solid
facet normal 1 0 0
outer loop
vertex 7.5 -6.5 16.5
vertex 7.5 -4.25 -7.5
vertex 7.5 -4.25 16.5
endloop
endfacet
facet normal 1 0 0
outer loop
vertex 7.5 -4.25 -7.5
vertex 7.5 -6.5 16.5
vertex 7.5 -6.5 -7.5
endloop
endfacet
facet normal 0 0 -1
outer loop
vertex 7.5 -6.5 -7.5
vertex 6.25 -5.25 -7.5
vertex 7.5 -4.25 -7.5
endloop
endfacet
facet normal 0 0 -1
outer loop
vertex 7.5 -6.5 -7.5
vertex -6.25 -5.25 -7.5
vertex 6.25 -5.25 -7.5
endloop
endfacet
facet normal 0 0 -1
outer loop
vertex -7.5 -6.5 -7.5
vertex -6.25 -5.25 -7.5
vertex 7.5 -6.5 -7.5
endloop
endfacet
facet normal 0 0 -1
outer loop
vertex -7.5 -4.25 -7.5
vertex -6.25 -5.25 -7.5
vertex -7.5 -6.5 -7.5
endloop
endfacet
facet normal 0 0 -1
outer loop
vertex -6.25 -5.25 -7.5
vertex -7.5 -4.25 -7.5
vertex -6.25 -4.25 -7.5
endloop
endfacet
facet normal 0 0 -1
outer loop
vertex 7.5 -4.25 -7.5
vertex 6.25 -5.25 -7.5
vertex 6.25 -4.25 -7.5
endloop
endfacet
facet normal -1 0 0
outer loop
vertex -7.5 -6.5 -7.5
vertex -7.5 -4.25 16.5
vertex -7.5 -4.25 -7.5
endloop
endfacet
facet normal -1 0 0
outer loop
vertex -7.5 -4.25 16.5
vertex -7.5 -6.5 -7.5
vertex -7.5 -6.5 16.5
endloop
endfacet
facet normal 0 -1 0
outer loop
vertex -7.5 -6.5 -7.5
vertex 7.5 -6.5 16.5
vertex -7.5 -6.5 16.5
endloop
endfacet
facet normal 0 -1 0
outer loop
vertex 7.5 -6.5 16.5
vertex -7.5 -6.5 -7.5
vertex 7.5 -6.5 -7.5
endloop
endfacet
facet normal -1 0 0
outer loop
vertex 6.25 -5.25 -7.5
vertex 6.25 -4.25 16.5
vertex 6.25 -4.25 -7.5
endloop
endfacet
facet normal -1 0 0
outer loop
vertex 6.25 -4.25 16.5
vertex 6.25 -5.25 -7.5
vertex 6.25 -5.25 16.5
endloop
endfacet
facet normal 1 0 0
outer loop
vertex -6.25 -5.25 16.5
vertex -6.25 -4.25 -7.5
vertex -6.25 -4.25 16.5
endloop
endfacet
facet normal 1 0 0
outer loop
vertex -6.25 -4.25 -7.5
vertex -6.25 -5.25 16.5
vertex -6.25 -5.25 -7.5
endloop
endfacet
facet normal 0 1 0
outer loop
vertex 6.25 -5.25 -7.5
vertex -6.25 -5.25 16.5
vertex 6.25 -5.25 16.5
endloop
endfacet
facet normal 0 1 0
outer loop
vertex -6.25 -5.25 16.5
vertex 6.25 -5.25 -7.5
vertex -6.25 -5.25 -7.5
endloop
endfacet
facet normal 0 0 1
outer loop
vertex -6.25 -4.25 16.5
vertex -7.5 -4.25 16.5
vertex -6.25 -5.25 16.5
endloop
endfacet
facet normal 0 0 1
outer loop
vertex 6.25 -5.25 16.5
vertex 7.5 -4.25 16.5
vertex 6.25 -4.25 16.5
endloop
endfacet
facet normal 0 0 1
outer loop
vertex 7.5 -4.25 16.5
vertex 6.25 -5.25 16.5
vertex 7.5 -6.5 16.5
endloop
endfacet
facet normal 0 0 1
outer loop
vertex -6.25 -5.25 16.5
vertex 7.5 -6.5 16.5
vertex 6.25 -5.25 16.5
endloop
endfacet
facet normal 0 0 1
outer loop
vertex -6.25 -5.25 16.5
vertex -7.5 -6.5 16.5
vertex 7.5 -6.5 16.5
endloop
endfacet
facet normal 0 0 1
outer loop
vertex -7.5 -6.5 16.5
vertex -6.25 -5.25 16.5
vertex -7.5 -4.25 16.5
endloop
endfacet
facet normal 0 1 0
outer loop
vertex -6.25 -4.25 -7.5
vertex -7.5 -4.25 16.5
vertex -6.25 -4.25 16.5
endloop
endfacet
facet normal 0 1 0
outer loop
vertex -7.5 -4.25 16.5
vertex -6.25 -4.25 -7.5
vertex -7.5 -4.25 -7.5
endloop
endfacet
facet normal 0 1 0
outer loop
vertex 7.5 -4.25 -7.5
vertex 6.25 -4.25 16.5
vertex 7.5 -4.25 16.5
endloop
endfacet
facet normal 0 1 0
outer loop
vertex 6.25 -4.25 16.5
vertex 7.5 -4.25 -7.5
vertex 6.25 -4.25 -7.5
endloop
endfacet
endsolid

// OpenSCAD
module motor() {
    difference() {
        union() {
            translate([0, 0, (15 + 9) / 2])
                cube([12, 10, 9], center=true);
            intersection() {
                cube([12, 10, 15], center=true);
                cylinder(d=12, h=15, center=true, $fn=32);
            }

            translate([0, 0, (15 + 10) / 2 + 9])
                intersection() {
                    translate([0, 0.25, 0])
                        cube([3, 2.5, 10], center=true);
                    cylinder(d=3, h=10, center=true, $fn=16);
                }
        }

        translate([0, 0, (15) / 2 + 9])
            for (t = [[4.5, 0, 0], [-4.5, 0, 0]]) {
                translate(t)
                    cylinder(d=1, h=5, center=true, $fn=16);
            }
    }
}

module motor_mount() {
    difference() {
        union() {
            translate([0, 0, (15 + 9 - 15) / 2 + 0.5])
                cube([14+1, 12+1, 10 + 15], center=true);
            translate([0, 6 - 0.5+0.5, 0])
                cube([24, 1, 15], center=true);
        }

        translate([0, 0, (15 + 9 - 15) / 2])
            cube([12+0.5, 10+0.5, 9 + 15 + 0.5], center=true);
        

        translate([0, 0, (15) / 2 + 9])
            for (t = [[4.5, 0, 0], [-4.5, 0, 0]]) {
                translate(t)
                    cylinder(d=1, h=5, center=true, $fn=16);
            }
        translate([0, 0, (15 + 10) / 2 + 9])
                cylinder(d=3+0.5, h=10, center=true, $fn=16);
            
        for (t = [[-9.5, 5, -4.5], [9.5, 5, -4.5], [-9.5, 5, 4.5], [9.5, 5, 4.5]]) {
            translate(t)
                rotate([90,0,0])
                    cylinder(d = 2, h = 10, center=true, $fn=16);
        }
            
    }
}

motor();

!intersection() {
    motor_mount();

    translate([0, -6 + 0.5-0.5, 9 / 2])
        cube([24, 3.5, 15+9], center=true);
}

difference() {
    motor_mount();

    translate([0, -6 + 0.5-0.5, 9 / 2])
        cube([24, 2, 15+9], center=true);
}
